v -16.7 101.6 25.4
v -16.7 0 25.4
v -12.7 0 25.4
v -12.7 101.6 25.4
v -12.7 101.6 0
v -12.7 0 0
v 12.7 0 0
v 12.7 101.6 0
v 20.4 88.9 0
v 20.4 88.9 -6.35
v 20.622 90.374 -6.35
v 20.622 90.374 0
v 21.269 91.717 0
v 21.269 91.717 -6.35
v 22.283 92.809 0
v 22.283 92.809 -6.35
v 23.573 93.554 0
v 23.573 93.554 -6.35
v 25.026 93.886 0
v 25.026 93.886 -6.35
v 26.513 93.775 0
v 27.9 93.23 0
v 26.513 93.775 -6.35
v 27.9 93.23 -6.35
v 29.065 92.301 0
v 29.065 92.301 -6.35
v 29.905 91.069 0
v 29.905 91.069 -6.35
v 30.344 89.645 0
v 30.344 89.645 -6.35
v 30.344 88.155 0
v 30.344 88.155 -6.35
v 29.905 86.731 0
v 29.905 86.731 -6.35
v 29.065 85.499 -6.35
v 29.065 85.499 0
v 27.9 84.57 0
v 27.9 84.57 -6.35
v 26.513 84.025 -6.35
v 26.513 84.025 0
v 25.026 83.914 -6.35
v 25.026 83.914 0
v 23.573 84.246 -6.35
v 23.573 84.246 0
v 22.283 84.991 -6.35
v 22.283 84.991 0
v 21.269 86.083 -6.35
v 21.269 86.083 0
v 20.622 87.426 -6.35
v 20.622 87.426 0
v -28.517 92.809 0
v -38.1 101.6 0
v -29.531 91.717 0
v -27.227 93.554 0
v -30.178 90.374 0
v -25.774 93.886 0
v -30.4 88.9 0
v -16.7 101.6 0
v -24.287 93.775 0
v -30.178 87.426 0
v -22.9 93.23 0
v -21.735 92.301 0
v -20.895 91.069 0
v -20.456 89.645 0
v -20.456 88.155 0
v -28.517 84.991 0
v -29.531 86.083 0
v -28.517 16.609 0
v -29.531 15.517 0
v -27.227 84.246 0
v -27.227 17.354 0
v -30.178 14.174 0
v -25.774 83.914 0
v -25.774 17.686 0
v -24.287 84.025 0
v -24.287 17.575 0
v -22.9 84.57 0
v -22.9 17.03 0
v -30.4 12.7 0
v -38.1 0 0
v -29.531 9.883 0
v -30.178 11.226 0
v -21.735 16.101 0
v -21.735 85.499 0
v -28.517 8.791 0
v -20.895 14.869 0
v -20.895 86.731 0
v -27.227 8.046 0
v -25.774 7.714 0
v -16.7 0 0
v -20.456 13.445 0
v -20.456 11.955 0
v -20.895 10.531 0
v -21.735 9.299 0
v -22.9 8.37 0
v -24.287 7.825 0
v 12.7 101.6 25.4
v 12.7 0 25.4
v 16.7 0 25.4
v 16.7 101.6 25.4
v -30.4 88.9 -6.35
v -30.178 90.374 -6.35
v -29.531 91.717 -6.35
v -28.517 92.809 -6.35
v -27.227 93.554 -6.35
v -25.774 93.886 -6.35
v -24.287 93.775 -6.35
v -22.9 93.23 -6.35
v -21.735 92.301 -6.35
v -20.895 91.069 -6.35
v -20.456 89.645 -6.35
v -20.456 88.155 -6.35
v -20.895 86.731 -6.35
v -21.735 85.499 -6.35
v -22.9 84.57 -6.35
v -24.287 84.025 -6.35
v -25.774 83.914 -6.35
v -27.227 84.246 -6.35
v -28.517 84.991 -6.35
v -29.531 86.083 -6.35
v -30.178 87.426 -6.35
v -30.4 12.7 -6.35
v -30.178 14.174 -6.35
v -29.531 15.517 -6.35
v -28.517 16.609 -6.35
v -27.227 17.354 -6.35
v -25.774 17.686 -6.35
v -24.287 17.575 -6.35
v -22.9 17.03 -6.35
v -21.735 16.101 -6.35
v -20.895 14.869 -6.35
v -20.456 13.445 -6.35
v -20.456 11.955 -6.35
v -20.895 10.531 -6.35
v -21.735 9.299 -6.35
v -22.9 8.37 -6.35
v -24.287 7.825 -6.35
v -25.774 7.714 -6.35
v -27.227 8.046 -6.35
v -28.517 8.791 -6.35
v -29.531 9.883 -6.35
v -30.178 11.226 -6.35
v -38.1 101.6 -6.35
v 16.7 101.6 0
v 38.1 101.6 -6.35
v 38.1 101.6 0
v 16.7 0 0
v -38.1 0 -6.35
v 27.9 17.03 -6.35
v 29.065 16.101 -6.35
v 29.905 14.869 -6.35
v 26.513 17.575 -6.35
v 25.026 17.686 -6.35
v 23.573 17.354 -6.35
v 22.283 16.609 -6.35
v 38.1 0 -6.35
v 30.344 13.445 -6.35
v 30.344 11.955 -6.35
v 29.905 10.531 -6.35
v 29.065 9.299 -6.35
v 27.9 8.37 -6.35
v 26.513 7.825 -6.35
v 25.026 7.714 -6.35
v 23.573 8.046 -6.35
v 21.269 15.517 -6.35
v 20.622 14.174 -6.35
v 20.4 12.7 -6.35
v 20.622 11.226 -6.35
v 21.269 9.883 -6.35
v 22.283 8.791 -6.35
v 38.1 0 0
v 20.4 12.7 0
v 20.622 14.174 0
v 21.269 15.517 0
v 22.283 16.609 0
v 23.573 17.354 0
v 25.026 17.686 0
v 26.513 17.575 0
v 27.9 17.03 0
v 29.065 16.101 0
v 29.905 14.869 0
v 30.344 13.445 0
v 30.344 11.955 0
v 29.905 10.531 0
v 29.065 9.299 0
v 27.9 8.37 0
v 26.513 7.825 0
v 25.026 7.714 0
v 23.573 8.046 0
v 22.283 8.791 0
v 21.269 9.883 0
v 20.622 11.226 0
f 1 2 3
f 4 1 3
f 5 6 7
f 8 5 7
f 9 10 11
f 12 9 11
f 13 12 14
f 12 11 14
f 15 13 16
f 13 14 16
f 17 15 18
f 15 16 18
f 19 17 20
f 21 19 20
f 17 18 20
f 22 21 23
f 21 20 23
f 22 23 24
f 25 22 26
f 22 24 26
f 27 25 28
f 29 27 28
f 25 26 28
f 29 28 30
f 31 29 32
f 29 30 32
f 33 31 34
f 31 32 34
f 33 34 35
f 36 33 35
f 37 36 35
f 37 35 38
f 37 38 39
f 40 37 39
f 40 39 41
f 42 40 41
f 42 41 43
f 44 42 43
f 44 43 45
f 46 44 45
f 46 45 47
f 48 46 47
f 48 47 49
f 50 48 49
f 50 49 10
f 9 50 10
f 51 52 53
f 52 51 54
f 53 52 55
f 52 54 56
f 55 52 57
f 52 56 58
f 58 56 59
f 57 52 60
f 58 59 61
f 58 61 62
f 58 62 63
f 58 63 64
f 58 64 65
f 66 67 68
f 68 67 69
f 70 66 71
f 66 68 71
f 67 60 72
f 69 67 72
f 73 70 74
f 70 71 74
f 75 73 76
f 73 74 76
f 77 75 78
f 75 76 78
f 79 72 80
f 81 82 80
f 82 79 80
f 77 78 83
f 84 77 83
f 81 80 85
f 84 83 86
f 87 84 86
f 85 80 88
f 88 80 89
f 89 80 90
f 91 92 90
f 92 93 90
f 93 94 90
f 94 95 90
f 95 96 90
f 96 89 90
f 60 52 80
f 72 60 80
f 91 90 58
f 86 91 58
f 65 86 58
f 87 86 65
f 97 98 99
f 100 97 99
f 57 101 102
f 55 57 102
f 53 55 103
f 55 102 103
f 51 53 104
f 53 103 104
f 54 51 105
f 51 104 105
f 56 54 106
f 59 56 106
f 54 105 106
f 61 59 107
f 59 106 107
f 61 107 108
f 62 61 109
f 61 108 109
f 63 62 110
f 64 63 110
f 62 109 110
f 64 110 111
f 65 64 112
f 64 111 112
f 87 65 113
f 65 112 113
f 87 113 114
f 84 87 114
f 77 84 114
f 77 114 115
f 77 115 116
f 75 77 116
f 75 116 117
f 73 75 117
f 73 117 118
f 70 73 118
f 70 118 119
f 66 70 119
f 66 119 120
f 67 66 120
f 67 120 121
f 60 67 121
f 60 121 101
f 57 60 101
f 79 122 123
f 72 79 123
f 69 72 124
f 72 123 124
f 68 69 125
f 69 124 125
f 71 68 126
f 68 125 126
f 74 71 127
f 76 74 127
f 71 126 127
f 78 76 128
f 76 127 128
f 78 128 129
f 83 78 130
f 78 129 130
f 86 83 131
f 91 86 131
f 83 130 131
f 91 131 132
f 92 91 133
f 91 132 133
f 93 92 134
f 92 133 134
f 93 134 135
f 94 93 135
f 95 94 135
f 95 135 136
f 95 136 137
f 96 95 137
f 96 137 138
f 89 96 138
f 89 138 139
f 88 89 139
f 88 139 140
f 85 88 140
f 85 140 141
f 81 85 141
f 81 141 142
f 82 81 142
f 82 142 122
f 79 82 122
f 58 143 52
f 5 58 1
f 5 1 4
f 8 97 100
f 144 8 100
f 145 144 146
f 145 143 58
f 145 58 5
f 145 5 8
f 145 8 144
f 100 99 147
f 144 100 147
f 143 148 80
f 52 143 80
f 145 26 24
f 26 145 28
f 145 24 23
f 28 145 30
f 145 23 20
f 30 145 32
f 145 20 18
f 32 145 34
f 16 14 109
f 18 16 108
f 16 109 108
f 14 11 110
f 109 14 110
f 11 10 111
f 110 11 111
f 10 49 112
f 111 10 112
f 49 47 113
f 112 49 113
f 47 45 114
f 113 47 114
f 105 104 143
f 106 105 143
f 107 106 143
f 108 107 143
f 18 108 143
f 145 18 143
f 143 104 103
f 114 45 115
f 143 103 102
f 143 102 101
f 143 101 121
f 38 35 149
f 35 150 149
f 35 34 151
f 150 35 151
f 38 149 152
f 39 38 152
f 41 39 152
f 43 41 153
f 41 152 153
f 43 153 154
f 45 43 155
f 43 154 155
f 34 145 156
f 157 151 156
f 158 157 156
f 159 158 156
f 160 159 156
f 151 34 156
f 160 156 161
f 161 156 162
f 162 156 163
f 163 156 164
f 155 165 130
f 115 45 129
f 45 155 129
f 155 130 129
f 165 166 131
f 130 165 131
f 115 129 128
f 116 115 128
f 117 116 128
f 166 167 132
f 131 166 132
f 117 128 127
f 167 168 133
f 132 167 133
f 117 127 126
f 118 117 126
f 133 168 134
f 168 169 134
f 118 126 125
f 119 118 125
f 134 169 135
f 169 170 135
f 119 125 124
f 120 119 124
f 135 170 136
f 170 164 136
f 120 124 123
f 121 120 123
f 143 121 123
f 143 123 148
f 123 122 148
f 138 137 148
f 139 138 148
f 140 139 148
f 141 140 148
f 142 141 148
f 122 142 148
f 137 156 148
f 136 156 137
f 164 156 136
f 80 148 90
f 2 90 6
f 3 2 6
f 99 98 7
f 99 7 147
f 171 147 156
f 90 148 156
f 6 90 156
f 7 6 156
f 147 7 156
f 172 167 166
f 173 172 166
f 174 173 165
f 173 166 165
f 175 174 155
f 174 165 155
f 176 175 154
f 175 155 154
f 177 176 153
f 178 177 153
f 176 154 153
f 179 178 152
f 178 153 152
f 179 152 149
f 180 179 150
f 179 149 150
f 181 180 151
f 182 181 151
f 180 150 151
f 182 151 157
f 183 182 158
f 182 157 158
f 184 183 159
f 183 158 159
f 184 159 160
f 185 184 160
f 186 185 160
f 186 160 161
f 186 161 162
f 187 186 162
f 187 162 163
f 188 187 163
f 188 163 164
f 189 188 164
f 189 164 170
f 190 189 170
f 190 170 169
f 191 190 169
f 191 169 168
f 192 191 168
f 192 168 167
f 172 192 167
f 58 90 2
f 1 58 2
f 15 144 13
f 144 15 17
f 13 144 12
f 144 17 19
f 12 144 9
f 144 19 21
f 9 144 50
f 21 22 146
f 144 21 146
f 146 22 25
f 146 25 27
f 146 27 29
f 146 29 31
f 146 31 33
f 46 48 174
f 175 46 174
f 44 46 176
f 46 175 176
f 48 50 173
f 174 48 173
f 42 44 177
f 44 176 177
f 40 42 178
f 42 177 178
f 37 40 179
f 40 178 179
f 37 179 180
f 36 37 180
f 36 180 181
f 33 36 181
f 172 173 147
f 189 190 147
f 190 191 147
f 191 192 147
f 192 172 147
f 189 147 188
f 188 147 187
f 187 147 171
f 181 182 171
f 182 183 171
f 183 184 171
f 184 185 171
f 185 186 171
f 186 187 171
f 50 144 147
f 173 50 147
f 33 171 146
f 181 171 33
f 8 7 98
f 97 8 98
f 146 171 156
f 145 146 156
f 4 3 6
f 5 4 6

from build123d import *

# Parameters (mm, degrees)
BOSS_EXTRUDE1_DEPTH = 101.6
SKETCH2_R           = 5
CUT_EXTRUDE1_DEPTH  = 114.058535724


with BuildPart() as part:
    # Sketch1 → Boss-Extrude1 (new body)
    with BuildSketch(Plane(origin=(0, 0, 0), x_dir=(1, 0, 0), z_dir=(0, 1, 0))):
        Polygon((-12.7, 0), (12.7, 0), (12.7, -25.4), (16.7, -25.4), (16.7, 0), (38.1, 0), (38.1, 6.35), (-38.1, 6.35), (-38.1, 0), (-16.7, 0), (-16.7, -25.4), (-12.7, -25.4), align=None)
    extrude(amount=BOSS_EXTRUDE1_DEPTH)

    # Sketch2 → Cut-Extrude1 (cut, through all)
    with BuildSketch(Plane(origin=(0, 0, -6.35), x_dir=(-1, 0, 0), z_dir=(0, 0, -1))):
        with Locations((-25.4, 88.9)):
            Circle(SKETCH2_R)
        with Locations((25.4, 88.9)):
            Circle(SKETCH2_R)
        with Locations((-25.4, 12.7)):
            Circle(SKETCH2_R)
        with Locations((25.4, 12.7)):
            Circle(SKETCH2_R)
    extrude(amount=-CUT_EXTRUDE1_DEPTH, mode=Mode.SUBTRACT)


solid = part.part
